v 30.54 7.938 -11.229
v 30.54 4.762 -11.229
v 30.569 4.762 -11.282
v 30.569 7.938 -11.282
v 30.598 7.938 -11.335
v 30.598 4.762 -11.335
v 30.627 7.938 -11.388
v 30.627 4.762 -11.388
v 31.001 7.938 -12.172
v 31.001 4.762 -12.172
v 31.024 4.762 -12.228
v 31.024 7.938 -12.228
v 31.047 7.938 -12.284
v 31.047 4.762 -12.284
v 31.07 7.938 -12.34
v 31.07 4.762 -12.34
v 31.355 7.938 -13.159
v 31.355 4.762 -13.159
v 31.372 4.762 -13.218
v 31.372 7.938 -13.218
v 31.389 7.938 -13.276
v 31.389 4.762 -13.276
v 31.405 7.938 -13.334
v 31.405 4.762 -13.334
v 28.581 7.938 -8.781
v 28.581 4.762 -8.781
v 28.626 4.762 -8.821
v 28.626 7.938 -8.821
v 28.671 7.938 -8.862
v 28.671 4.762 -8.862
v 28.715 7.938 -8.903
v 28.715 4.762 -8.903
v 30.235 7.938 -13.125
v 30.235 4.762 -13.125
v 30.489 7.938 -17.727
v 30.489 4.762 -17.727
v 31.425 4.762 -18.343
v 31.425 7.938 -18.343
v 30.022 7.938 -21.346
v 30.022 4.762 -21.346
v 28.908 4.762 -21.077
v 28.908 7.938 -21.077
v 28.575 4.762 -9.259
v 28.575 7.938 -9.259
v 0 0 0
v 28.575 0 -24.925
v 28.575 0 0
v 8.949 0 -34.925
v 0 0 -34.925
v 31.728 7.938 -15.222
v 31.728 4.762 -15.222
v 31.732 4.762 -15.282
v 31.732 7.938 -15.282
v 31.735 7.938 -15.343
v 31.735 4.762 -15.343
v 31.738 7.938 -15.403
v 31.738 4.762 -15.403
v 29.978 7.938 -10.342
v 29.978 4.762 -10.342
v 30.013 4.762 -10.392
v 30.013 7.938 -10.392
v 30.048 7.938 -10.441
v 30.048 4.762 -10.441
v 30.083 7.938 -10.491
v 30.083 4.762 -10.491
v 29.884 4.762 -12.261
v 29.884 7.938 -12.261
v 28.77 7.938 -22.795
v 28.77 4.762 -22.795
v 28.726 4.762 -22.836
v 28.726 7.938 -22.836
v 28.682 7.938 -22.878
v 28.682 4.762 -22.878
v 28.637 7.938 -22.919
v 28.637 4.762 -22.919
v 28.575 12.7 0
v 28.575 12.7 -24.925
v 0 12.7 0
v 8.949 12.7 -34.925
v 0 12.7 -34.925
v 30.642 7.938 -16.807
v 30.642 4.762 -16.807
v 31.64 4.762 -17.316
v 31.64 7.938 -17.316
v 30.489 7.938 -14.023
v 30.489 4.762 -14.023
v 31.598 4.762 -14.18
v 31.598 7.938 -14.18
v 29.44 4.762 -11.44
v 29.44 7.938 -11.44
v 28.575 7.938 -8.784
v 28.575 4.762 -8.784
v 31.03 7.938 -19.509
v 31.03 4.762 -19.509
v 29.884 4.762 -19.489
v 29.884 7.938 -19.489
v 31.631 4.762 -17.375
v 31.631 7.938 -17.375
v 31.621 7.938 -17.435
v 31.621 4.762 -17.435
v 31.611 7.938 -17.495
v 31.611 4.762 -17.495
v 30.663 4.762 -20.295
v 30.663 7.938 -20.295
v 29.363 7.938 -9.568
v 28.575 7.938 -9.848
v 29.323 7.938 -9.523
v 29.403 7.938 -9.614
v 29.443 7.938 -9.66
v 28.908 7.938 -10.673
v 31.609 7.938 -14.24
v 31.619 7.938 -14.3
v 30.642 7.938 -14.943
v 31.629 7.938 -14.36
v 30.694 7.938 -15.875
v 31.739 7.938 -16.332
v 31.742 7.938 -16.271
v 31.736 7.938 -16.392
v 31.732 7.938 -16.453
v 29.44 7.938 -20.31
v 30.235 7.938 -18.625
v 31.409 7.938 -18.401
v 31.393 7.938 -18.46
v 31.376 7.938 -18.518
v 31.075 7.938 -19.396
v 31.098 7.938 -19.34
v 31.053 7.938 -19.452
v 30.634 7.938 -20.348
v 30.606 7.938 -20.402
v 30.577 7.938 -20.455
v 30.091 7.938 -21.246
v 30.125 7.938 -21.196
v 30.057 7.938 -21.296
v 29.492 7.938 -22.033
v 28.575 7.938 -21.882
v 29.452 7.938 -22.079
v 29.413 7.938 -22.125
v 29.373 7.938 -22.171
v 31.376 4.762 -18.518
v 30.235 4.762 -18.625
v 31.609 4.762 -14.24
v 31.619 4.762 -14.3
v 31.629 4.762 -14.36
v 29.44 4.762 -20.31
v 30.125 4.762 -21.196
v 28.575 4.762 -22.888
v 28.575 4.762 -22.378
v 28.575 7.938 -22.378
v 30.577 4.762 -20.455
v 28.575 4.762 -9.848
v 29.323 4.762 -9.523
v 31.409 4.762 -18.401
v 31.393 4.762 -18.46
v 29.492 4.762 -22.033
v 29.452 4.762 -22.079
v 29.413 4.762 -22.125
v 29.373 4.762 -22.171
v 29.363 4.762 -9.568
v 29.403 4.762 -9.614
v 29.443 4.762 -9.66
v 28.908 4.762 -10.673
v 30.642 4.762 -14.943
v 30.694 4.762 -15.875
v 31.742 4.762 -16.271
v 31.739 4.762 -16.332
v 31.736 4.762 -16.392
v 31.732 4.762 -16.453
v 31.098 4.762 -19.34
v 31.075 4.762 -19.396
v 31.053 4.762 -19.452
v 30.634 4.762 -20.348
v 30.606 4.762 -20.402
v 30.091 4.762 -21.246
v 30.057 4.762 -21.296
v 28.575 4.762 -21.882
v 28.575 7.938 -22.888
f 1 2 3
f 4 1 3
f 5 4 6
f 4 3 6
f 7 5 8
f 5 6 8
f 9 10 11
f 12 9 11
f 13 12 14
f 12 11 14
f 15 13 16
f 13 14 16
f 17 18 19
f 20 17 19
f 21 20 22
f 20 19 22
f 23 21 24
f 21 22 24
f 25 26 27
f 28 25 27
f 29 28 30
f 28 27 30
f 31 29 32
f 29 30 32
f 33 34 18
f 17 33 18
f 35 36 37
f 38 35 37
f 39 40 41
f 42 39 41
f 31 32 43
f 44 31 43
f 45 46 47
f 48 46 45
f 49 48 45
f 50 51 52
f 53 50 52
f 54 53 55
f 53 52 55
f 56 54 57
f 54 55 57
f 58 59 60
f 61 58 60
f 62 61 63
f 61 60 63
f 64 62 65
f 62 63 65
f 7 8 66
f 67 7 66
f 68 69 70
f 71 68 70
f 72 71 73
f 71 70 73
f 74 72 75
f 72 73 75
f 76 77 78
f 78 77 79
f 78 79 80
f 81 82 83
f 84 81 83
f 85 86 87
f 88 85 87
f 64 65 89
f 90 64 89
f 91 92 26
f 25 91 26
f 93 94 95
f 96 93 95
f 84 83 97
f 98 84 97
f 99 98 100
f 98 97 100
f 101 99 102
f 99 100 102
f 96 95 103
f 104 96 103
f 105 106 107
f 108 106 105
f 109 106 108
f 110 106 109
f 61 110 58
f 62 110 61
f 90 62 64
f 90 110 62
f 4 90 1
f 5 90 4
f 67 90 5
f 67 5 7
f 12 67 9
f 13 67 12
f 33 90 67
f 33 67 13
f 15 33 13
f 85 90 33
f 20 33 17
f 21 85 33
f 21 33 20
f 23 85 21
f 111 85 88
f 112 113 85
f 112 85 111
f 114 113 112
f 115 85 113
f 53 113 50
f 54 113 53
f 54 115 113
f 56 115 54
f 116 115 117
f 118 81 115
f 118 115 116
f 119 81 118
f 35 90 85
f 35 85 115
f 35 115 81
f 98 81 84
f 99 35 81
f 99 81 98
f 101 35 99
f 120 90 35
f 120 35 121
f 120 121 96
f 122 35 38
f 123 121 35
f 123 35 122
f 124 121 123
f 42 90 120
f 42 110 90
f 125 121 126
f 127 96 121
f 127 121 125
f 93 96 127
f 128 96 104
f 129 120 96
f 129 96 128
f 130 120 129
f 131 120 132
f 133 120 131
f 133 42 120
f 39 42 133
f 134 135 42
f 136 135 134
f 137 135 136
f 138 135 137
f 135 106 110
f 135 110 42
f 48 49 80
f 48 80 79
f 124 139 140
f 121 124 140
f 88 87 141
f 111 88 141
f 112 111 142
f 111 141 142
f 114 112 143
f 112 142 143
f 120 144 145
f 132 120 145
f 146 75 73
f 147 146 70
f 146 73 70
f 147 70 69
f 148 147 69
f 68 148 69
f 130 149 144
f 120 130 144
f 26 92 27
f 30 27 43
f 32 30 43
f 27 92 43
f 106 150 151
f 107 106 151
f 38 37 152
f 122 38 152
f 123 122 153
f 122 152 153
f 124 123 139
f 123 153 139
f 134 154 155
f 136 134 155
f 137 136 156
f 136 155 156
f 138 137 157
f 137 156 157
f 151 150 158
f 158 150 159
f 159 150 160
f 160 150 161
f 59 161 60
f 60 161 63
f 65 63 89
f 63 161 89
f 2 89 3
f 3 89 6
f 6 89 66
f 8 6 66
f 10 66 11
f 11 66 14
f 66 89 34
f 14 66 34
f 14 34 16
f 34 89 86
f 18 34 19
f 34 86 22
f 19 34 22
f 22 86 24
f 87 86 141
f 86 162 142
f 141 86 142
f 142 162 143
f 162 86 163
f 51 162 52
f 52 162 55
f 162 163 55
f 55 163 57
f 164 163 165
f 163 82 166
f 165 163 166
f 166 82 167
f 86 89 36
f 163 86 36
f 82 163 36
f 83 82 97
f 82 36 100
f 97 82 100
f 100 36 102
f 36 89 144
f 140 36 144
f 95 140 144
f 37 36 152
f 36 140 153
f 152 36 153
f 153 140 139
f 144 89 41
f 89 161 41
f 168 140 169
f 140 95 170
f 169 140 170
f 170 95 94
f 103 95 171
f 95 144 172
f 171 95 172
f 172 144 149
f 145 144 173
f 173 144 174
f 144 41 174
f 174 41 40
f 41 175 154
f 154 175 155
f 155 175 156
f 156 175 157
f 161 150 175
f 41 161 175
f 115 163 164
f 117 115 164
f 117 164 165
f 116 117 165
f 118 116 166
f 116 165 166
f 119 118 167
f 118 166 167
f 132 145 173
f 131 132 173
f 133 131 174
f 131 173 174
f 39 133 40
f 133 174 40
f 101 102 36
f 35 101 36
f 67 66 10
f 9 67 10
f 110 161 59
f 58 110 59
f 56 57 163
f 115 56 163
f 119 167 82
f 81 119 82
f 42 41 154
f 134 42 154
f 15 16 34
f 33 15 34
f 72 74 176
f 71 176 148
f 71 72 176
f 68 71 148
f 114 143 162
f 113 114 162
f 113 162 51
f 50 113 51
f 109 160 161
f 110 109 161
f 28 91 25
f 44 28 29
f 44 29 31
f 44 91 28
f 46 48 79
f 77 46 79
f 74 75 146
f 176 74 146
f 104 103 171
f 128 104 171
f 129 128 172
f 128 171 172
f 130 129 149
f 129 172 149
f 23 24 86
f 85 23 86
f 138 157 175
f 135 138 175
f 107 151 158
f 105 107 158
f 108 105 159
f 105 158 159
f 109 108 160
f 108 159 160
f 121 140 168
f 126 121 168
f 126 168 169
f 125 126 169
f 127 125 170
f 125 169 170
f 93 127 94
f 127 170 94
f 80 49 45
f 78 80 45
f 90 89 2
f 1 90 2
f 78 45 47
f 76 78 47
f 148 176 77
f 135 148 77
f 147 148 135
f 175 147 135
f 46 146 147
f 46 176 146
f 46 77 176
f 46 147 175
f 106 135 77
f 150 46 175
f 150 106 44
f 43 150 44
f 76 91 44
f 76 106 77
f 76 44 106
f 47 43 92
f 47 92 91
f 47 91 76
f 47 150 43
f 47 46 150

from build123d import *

# Parameters (mm, degrees)
BOSS_EXTRUDE3_DEPTH = 12.7
BOSS_EXTRUDE5_DEPTH = 3.175
CHAMFER1_SIZE       = 10
CHAMFER1_SIZE2      = 19.626105055


with BuildPart() as part:
    # Sketch1 → Boss-Extrude3 (new body)
    with BuildSketch(Plane(origin=(0, 0, 0), x_dir=(1, 0, 0), z_dir=(0, 1, 0))):
        Polygon((0, 20.6375), (0, 34.925), (28.575, 34.925), (28.575, 0), (12.7, 0), (7.9375, 0), (0, 0), (0, 15.875), align=None)
    extrude(amount=BOSS_EXTRUDE3_DEPTH)

    # Sketch8 → Boss-Extrude5 (add)
    with BuildSketch(Plane(origin=(0, 4.7625, 0), x_dir=(1, 0, 0), z_dir=(0, 1, 0))):
        with BuildLine():
            Line((31.738320164, 15.403444634), (30.693867565, 15.875))
            Line((30.693867565, 15.875), (31.741764678, 16.270998814))
            ThreePointArc((31.741764678, 16.270998814), (31.737544766, 16.361946694), (31.732455721, 16.452850083))
            Line((31.732455721, 16.452850083), (30.642467275, 16.806645055))
            Line((30.642467275, 16.806645055), (31.640441237, 17.315517721))
            ThreePointArc((31.640441237, 17.315517721), (31.626241922, 17.405449384), (31.611183644, 17.495241214))
            Line((31.611183644, 17.495241214), (30.488890335, 17.7269812))
            Line((30.488890335, 17.7269812), (31.424827094, 18.342550695))
            ThreePointArc((31.424827094, 18.342550695), (31.400820737, 18.430374492), (31.375976014, 18.517964812))
            Line((31.375976014, 18.517964812), (30.235000961, 18.624836803))
            Line((30.235000961, 18.624836803), (31.097539513, 19.339630946))
            ThreePointArc((31.097539513, 19.339630946), (31.064017519, 19.424280815), (31.02968793, 19.508606397))
            Line((31.02968793, 19.508606397), (29.883881026, 19.489313112))
            Line((29.883881026, 19.489313112), (30.662551321, 20.29465527))
            ThreePointArc((30.662551321, 20.29465527), (30.619920601, 20.375103677), (30.576522862, 20.455140923))
            Line((30.576522862, 20.455140923), (29.43979265, 20.309916556))
            Line((29.43979265, 20.309916556), (30.125142686, 21.196030966))
            ThreePointArc((30.125142686, 21.196030966), (30.073920719, 21.271301376), (30.02198162, 21.346078743))
            Line((30.02198162, 21.346078743), (28.908126465, 21.076686121))
            Line((28.908126465, 21.076686121), (29.49183702, 22.032816555))
            ThreePointArc((29.49183702, 22.032816555), (29.432645572, 22.101995287), (29.372795584, 22.170605078))
            Line((29.372795584, 22.170605078), (28.295336177, 21.780314262))
            Line((28.295336177, 21.780314262), (28.770321797, 22.794854592))
            ThreePointArc((28.770321797, 22.794854592), (28.703879372, 22.85710191), (28.636844991, 22.918711295))
            Line((28.636844991, 22.918711295), (27.608860232, 22.412259888))
            Line((27.608860232, 22.412259888), (27.969355234, 23.472894968))
            ThreePointArc((27.969355234, 23.472894968), (27.896468352, 23.527455275), (27.823063286, 23.581316399))
            Line((27.823063286, 23.581316399), (26.857031516, 22.964852035))
            Line((26.857031516, 22.964852035), (27.098659979, 24.058707192))
            ThreePointArc((27.098659979, 24.058707192), (27.02021339, 24.104918198), (26.941328676, 24.150377261))
            Line((26.941328676, 24.150377261), (26.048976213, 23.431382982))
            Line((26.048976213, 23.431382982), (26.168805095, 24.545180296))
            ThreePointArc((26.168805095, 24.545180296), (26.085751033, 24.582481063), (26.002344225, 24.618986254))
            Line((26.002344225, 24.618986254), (25.194503018, 23.806189675))
            Line((25.194503018, 23.806189675), (25.191077759, 24.926409157))
            ThreePointArc((25.191077759, 24.926409157), (25.104424388, 24.954346904), (25.017507932, 24.981455098))
            Line((25.017507932, 24.981455098), (24.30398408, 24.08472247))
            Line((24.30398408, 24.08472247), (24.177346257, 25.197766172))
            ThreePointArc((24.177346257, 25.197766172), (24.088145431, 25.216001772), (23.998774375, 25.233383913))
            Line((23.998774375, 25.233383913), (23.388229091, 24.263600355))
            Line((23.388229091, 24.263600355), (23.139915917, 25.355957434))
            ThreePointArc((23.139915917, 25.355957434), (23.049250413, 25.364269532), (22.9585096, 25.371714625))
            Line((22.9585096, 25.371714625), (22.458354076, 24.340651996))
            Line((22.458354076, 24.340651996), (22.091379736, 25.399062716))
            ThreePointArc((22.091379736, 25.399062716), (22.000350112, 25.397350415), (21.909341013, 25.394768086))
            Line((21.909341013, 25.394768086), (21.52564646, 24.314942089))
            Line((21.52564646, 24.314942089), (21.044465525, 25.326558779))
            ThreePointArc((21.044465525, 25.326558779), (20.954176755, 25.314842863), (20.864004098, 25.302264458))
            Line((20.864004098, 25.302264458), (20.601428047, 24.186782718))
            Line((20.601428047, 24.186782718), (20.011881402, 25.139325721))
            ThreePointArc((20.011881402, 25.139325721), (19.923429472, 25.117748406), (19.835187829, 25.09532661))
            Line((19.835187829, 25.09532661), (19.696917599, 23.957729565))
            Line((19.696917599, 23.957729565), (19.006161542, 24.839636299))
            ThreePointArc((19.006161542, 24.839636299), (18.920620137, 24.808459505), (18.835380643, 24.776466487))
            Line((18.835380643, 24.776466487), (18.823094647, 23.630563023))
            Line((18.823094647, 23.630563023), (18.03951402, 24.431128337))
            ThreePointArc((18.03951402, 24.431128337), (17.957921497, 24.390730506), (17.876718844, 24.349554619))
            Line((17.876718844, 24.349554619), (17.990566217, 23.209254453))
            Line((17.990566217, 23.209254453), (17.123672628, 23.918760566))
            ThreePointArc((17.123672628, 23.918760566), (17.04701941, 23.869632075), (16.970839288, 23.819773138))
            Line((16.970839288, 23.819773138), (17.209438078, 22.698917969))
            Line((17.209438078, 22.698917969), (16.26975444, 23.308752439))
            ThreePointArc((16.26975444, 23.308752439), (16.198970993, 23.25148964), (16.128738126, 23.193552874))
            Line((16.128738126, 23.193552874), (16.489192065, 22.105748364))
            Line((16.489192065, 22.105748364), (15.488124866, 22.608508627))
            ThreePointArc((15.488124866, 22.608508627), (15.424070405, 22.543806613), (15.360637325, 22.478495291))
            Line((15.360637325, 22.478495291), (15.838570992, 21.436945915))
            Line((15.838570992, 21.436945915), (14.78827183, 21.826529142))
            ThreePointArc((14.78827183, 21.826529142), (14.73172389, 21.755173308), (14.675860587, 21.683280221))
            Line((14.675860587, 21.683280221), (15.265472515, 20.700628977))
            Line((15.265472515, 20.700628977), (14.1786906, 20.972306155))
            ThreePointArc((14.1786906, 20.972306155), (14.130335596, 20.895162665), (14.082720176, 20.817560498))
            Line((14.082720176, 20.817560498), (14.776853274, 19.90573544))
            Line((14.776853274, 19.90573544), (13.666780666, 20.056208776))
            ThreePointArc((13.666780666, 20.056208776), (13.627205562, 19.974214047), (13.588416012, 19.891844785))
            Line((13.588416012, 19.891844785), (14.378644445, 19.061914235))
            Line((14.378644445, 19.061914235), (13.258755922, 19.089357187))
            ThreePointArc((13.258755922, 19.089357187), (13.228441106, 19.003506523), (13.198948279, 18.917370018))
            Line((13.198948279, 18.917370018), (14.075679743, 18.179408208))
            Line((14.075679743, 18.179408208), (12.959569234, 18.083487656))
            ThreePointArc((12.959569234, 18.083487656), (12.938882688, 17.994823169), (12.919044586, 17.905965))
            Line((12.919044586, 17.905965), (13.87163675, 17.268929787))
            Line((13.87163675, 17.268929787), (12.772852325, 17.050810077))
            ThreePointArc((12.772852325, 17.050810077), (12.762045155, 16.960408033), (12.752102586, 16.869906818))
            Line((12.752102586, 16.869906818), (13.768992271, 16.341530947))
            Line((13.768992271, 16.341530947), (12.700871685, 16.003859756))
            ThreePointArc((12.700871685, 16.003859756), (12.700075075, 15.912817513), (12.700148728, 15.821771815))
            Line((12.700148728, 15.821771815), (13.768992271, 15.408469053))
            Line((13.768992271, 15.408469053), (12.74450106, 14.955345252))
            ThreePointArc((12.74450106, 14.955345252), (12.75372468, 14.86476794), (12.763813661, 14.774282931))
            Line((12.763813661, 14.774282931), (13.87163675, 14.481070213))
            Line((13.87163675, 14.481070213), (12.90321085, 13.917994111))
            ThreePointArc((12.90321085, 13.917994111), (12.922342738, 13.828981216), (12.942324581, 13.74015526))
            Line((12.942324581, 13.74015526), (14.075679743, 13.570591792))
            Line((14.075679743, 13.570591792), (13.175074533, 12.90439837))
            ThreePointArc((13.175074533, 12.90439837), (13.203882453, 12.818030388), (13.233514605, 12.731941713))
            Line((13.233514605, 12.731941713), (14.378644445, 12.688085765))
            Line((14.378644445, 12.688085765), (13.556792052, 11.926861709))
            ThreePointArc((13.556792052, 11.926861709), (13.594926315, 11.844187031), (13.633849082, 11.761880635))
            Line((13.633849082, 11.761880635), (14.776853274, 11.84426456))
            Line((14.776853274, 11.84426456), (14.043729872, 10.997250099))
            ThreePointArc((14.043729872, 10.997250099), (14.090727581, 10.919272282), (14.138468493, 10.841747255))
            Line((14.138468493, 10.841747255), (15.265472515, 11.049371023))
            Line((15.265472515, 11.049371023), (14.62997723, 10.126847765))
            ThreePointArc((14.62997723, 10.126847765), (14.685267895, 10.054513355), (14.741247443, 9.982710745))
            Line((14.741247443, 9.982710745), (15.838570992, 10.313054085))
            Line((15.838570992, 10.313054085), (15.308417875, 9.326220212))
            ThreePointArc((15.308417875, 9.326220212), (15.371330343, 9.260407251), (15.43486901, 9.195198645))
            Line((15.43486901, 9.195198645), (16.489192065, 9.644251636))
            Line((16.489192065, 9.644251636), (16.070816458, 8.605085975))
            ThreePointArc((16.070816458, 8.605085975), (16.140587057, 8.546593343), (16.21091357, 8.488770284))
            Line((16.21091357, 8.488770284), (17.209438078, 9.051082031))
            Line((17.209438078, 9.051082031), (16.907918492, 7.972198646))
            ThreePointArc((16.907918492, 7.972198646), (16.983700301, 7.921736364), (17.059960992, 7.872000747))
            Line((17.059960992, 7.872000747), (17.990566217, 8.540745547))
            Line((17.990566217, 8.540745547), (17.809562694, 7.43524062))
            ThreePointArc((17.809562694, 7.43524062), (17.890435824, 7.393421231), (17.971704991, 7.352376779))
            Line((17.971704991, 7.352376779), (18.823094647, 8.119436977))
            Line((18.823094647, 8.119436977), (18.764804323, 7.00072984))
            ThreePointArc((18.764804323, 7.00072984), (18.849787085, 6.968060976), (18.93507823, 6.936205912))
            Line((18.93507823, 6.936205912), (19.696917599, 7.792270435))
            Line((19.696917599, 7.792270435), (19.76204804, 6.673940678))
            ThreePointArc((19.76204804, 6.673940678), (19.850108857, 6.650818895), (19.938386662, 6.628539897))
            Line((19.938386662, 6.628539897), (20.601428047, 7.563217282))
            Line((20.601428047, 7.563217282), (20.789188657, 6.458839913))
            ThreePointArc((20.789188657, 6.458839913), (20.879258592, 6.445545877), (20.969451482, 6.433113381))
            Line((20.969451482, 6.433113381), (21.52564646, 7.435057911))
            Line((21.52564646, 7.435057911), (21.833758079, 6.358038575))
            ThreePointArc((21.833758079, 6.358038575), (21.924743803, 6.354733658), (22.015756961, 6.352298579))
            Line((22.015756961, 6.352298579), (22.458354076, 7.409348004))
            Line((22.458354076, 7.409348004), (22.883076648, 6.372760257))
            Line((22.883076648, 6.372760257), (23.064602367, 6.387076472))
            Line((23.064602367, 6.387076472), (23.388229091, 7.486399645))
            Line((23.388229091, 7.486399645), (23.924407058, 6.502826258))
            ThreePointArc((23.924407058, 6.502826258), (24.013913322, 6.519498189), (24.103256138, 6.537024905))
            Line((24.103256138, 6.537024905), (24.30398408, 7.66527753))
            Line((24.30398408, 7.66527753), (24.945108969, 6.746657752))
            Line((24.945108969, 6.746657752), (25.119110423, 6.800323705))
            Line((25.119110423, 6.800323705), (25.194503018, 7.943810325))
            Line((25.194503018, 7.943810325), (25.932792441, 7.101294955))
            ThreePointArc((25.932792441, 7.101294955), (26.016486493, 7.137136693), (26.099834128, 7.173776783))
            Line((26.099834128, 7.173776783), (26.048976213, 8.318617018))
            Line((26.048976213, 8.318617018), (26.875468336, 7.562433052))
            ThreePointArc((26.875468336, 7.562433052), (26.954711536, 7.607264289), (27.033522596, 7.652850923))
            Line((27.033522596, 7.652850923), (26.857031516, 8.785147965))
            Line((26.857031516, 8.785147965), (27.761693845, 8.124474452))
            ThreePointArc((27.761693845, 8.124474452), (27.835524287, 8.177750997), (27.908842114, 8.231730816))
            Line((27.908842114, 8.231730816), (27.608860232, 9.337740112))
            Line((27.608860232, 9.337740112), (28.58071139, 8.780596732))
            ThreePointArc((28.58071139, 8.780596732), (28.648232874, 8.84167188), (28.715167487, 8.903389642))
            Line((28.715167487, 8.903389642), (28.295336177, 9.969685738))
            Line((28.295336177, 9.969685738), (29.322579209, 9.522835458))
            ThreePointArc((29.322579209, 9.522835458), (29.382972116, 9.59096784), (29.44271102, 9.659674374))
            Line((29.44271102, 9.659674374), (28.908126465, 10.673313879))
            Line((28.908126465, 10.673313879), (29.978292032, 10.342180857))
            ThreePointArc((29.978292032, 10.342180857), (30.030823272, 10.416543437), (30.082641317, 10.49140474))
            Line((30.082641317, 10.49140474), (29.43979265, 11.440083444))
            Line((29.43979265, 11.440083444), (30.539890392, 11.228687185))
            ThreePointArc((30.539890392, 11.228687185), (30.583922307, 11.308377303), (30.627190494, 11.388484659))
            Line((30.627190494, 11.388484659), (29.883881026, 12.260686888))
            Line((29.883881026, 12.260686888), (31.000557246, 12.171593456))
            ThreePointArc((31.000557246, 12.171593456), (31.035555349, 12.255643782), (31.06974846, 12.340024797))
            Line((31.06974846, 12.340024797), (30.235000961, 13.125163197))
            Line((30.235000961, 13.125163197), (31.354700723, 13.159454066))
            ThreePointArc((31.354700723, 13.159454066), (31.380240185, 13.246844343), (31.404943161, 13.334474745))
            Line((31.404943161, 13.334474745), (30.488890335, 14.0230188))
            Line((30.488890335, 14.0230188), (31.598022, 14.180277726))
            ThreePointArc((31.598022, 14.180277726), (31.613792806, 14.269947153), (31.628705787, 14.359763229))
            Line((31.628705787, 14.359763229), (30.642467275, 14.943354945))
            Line((30.642467275, 14.943354945), (31.727567487, 15.221673018))
            ThreePointArc((31.727567487, 15.221673018), (31.733378201, 15.31253313), (31.738320164, 15.403444634))
        make_face()
    extrude(amount=BOSS_EXTRUDE5_DEPTH)

    # Chamfer1
    chamfer1_edges = [part.edges().sort_by_distance(p)[0] for p in [
        (28.575, 6.35, -34.925),
    ]]
    chamfer1_side = [part.faces().sort_by_distance(p)[0] for p in [
        (28.575, 6.35, -34.553375778),
    ]]
    chamfer(chamfer1_edges, length=CHAMFER1_SIZE, length2=CHAMFER1_SIZE2, reference=chamfer1_side[0])


solid = part.part
